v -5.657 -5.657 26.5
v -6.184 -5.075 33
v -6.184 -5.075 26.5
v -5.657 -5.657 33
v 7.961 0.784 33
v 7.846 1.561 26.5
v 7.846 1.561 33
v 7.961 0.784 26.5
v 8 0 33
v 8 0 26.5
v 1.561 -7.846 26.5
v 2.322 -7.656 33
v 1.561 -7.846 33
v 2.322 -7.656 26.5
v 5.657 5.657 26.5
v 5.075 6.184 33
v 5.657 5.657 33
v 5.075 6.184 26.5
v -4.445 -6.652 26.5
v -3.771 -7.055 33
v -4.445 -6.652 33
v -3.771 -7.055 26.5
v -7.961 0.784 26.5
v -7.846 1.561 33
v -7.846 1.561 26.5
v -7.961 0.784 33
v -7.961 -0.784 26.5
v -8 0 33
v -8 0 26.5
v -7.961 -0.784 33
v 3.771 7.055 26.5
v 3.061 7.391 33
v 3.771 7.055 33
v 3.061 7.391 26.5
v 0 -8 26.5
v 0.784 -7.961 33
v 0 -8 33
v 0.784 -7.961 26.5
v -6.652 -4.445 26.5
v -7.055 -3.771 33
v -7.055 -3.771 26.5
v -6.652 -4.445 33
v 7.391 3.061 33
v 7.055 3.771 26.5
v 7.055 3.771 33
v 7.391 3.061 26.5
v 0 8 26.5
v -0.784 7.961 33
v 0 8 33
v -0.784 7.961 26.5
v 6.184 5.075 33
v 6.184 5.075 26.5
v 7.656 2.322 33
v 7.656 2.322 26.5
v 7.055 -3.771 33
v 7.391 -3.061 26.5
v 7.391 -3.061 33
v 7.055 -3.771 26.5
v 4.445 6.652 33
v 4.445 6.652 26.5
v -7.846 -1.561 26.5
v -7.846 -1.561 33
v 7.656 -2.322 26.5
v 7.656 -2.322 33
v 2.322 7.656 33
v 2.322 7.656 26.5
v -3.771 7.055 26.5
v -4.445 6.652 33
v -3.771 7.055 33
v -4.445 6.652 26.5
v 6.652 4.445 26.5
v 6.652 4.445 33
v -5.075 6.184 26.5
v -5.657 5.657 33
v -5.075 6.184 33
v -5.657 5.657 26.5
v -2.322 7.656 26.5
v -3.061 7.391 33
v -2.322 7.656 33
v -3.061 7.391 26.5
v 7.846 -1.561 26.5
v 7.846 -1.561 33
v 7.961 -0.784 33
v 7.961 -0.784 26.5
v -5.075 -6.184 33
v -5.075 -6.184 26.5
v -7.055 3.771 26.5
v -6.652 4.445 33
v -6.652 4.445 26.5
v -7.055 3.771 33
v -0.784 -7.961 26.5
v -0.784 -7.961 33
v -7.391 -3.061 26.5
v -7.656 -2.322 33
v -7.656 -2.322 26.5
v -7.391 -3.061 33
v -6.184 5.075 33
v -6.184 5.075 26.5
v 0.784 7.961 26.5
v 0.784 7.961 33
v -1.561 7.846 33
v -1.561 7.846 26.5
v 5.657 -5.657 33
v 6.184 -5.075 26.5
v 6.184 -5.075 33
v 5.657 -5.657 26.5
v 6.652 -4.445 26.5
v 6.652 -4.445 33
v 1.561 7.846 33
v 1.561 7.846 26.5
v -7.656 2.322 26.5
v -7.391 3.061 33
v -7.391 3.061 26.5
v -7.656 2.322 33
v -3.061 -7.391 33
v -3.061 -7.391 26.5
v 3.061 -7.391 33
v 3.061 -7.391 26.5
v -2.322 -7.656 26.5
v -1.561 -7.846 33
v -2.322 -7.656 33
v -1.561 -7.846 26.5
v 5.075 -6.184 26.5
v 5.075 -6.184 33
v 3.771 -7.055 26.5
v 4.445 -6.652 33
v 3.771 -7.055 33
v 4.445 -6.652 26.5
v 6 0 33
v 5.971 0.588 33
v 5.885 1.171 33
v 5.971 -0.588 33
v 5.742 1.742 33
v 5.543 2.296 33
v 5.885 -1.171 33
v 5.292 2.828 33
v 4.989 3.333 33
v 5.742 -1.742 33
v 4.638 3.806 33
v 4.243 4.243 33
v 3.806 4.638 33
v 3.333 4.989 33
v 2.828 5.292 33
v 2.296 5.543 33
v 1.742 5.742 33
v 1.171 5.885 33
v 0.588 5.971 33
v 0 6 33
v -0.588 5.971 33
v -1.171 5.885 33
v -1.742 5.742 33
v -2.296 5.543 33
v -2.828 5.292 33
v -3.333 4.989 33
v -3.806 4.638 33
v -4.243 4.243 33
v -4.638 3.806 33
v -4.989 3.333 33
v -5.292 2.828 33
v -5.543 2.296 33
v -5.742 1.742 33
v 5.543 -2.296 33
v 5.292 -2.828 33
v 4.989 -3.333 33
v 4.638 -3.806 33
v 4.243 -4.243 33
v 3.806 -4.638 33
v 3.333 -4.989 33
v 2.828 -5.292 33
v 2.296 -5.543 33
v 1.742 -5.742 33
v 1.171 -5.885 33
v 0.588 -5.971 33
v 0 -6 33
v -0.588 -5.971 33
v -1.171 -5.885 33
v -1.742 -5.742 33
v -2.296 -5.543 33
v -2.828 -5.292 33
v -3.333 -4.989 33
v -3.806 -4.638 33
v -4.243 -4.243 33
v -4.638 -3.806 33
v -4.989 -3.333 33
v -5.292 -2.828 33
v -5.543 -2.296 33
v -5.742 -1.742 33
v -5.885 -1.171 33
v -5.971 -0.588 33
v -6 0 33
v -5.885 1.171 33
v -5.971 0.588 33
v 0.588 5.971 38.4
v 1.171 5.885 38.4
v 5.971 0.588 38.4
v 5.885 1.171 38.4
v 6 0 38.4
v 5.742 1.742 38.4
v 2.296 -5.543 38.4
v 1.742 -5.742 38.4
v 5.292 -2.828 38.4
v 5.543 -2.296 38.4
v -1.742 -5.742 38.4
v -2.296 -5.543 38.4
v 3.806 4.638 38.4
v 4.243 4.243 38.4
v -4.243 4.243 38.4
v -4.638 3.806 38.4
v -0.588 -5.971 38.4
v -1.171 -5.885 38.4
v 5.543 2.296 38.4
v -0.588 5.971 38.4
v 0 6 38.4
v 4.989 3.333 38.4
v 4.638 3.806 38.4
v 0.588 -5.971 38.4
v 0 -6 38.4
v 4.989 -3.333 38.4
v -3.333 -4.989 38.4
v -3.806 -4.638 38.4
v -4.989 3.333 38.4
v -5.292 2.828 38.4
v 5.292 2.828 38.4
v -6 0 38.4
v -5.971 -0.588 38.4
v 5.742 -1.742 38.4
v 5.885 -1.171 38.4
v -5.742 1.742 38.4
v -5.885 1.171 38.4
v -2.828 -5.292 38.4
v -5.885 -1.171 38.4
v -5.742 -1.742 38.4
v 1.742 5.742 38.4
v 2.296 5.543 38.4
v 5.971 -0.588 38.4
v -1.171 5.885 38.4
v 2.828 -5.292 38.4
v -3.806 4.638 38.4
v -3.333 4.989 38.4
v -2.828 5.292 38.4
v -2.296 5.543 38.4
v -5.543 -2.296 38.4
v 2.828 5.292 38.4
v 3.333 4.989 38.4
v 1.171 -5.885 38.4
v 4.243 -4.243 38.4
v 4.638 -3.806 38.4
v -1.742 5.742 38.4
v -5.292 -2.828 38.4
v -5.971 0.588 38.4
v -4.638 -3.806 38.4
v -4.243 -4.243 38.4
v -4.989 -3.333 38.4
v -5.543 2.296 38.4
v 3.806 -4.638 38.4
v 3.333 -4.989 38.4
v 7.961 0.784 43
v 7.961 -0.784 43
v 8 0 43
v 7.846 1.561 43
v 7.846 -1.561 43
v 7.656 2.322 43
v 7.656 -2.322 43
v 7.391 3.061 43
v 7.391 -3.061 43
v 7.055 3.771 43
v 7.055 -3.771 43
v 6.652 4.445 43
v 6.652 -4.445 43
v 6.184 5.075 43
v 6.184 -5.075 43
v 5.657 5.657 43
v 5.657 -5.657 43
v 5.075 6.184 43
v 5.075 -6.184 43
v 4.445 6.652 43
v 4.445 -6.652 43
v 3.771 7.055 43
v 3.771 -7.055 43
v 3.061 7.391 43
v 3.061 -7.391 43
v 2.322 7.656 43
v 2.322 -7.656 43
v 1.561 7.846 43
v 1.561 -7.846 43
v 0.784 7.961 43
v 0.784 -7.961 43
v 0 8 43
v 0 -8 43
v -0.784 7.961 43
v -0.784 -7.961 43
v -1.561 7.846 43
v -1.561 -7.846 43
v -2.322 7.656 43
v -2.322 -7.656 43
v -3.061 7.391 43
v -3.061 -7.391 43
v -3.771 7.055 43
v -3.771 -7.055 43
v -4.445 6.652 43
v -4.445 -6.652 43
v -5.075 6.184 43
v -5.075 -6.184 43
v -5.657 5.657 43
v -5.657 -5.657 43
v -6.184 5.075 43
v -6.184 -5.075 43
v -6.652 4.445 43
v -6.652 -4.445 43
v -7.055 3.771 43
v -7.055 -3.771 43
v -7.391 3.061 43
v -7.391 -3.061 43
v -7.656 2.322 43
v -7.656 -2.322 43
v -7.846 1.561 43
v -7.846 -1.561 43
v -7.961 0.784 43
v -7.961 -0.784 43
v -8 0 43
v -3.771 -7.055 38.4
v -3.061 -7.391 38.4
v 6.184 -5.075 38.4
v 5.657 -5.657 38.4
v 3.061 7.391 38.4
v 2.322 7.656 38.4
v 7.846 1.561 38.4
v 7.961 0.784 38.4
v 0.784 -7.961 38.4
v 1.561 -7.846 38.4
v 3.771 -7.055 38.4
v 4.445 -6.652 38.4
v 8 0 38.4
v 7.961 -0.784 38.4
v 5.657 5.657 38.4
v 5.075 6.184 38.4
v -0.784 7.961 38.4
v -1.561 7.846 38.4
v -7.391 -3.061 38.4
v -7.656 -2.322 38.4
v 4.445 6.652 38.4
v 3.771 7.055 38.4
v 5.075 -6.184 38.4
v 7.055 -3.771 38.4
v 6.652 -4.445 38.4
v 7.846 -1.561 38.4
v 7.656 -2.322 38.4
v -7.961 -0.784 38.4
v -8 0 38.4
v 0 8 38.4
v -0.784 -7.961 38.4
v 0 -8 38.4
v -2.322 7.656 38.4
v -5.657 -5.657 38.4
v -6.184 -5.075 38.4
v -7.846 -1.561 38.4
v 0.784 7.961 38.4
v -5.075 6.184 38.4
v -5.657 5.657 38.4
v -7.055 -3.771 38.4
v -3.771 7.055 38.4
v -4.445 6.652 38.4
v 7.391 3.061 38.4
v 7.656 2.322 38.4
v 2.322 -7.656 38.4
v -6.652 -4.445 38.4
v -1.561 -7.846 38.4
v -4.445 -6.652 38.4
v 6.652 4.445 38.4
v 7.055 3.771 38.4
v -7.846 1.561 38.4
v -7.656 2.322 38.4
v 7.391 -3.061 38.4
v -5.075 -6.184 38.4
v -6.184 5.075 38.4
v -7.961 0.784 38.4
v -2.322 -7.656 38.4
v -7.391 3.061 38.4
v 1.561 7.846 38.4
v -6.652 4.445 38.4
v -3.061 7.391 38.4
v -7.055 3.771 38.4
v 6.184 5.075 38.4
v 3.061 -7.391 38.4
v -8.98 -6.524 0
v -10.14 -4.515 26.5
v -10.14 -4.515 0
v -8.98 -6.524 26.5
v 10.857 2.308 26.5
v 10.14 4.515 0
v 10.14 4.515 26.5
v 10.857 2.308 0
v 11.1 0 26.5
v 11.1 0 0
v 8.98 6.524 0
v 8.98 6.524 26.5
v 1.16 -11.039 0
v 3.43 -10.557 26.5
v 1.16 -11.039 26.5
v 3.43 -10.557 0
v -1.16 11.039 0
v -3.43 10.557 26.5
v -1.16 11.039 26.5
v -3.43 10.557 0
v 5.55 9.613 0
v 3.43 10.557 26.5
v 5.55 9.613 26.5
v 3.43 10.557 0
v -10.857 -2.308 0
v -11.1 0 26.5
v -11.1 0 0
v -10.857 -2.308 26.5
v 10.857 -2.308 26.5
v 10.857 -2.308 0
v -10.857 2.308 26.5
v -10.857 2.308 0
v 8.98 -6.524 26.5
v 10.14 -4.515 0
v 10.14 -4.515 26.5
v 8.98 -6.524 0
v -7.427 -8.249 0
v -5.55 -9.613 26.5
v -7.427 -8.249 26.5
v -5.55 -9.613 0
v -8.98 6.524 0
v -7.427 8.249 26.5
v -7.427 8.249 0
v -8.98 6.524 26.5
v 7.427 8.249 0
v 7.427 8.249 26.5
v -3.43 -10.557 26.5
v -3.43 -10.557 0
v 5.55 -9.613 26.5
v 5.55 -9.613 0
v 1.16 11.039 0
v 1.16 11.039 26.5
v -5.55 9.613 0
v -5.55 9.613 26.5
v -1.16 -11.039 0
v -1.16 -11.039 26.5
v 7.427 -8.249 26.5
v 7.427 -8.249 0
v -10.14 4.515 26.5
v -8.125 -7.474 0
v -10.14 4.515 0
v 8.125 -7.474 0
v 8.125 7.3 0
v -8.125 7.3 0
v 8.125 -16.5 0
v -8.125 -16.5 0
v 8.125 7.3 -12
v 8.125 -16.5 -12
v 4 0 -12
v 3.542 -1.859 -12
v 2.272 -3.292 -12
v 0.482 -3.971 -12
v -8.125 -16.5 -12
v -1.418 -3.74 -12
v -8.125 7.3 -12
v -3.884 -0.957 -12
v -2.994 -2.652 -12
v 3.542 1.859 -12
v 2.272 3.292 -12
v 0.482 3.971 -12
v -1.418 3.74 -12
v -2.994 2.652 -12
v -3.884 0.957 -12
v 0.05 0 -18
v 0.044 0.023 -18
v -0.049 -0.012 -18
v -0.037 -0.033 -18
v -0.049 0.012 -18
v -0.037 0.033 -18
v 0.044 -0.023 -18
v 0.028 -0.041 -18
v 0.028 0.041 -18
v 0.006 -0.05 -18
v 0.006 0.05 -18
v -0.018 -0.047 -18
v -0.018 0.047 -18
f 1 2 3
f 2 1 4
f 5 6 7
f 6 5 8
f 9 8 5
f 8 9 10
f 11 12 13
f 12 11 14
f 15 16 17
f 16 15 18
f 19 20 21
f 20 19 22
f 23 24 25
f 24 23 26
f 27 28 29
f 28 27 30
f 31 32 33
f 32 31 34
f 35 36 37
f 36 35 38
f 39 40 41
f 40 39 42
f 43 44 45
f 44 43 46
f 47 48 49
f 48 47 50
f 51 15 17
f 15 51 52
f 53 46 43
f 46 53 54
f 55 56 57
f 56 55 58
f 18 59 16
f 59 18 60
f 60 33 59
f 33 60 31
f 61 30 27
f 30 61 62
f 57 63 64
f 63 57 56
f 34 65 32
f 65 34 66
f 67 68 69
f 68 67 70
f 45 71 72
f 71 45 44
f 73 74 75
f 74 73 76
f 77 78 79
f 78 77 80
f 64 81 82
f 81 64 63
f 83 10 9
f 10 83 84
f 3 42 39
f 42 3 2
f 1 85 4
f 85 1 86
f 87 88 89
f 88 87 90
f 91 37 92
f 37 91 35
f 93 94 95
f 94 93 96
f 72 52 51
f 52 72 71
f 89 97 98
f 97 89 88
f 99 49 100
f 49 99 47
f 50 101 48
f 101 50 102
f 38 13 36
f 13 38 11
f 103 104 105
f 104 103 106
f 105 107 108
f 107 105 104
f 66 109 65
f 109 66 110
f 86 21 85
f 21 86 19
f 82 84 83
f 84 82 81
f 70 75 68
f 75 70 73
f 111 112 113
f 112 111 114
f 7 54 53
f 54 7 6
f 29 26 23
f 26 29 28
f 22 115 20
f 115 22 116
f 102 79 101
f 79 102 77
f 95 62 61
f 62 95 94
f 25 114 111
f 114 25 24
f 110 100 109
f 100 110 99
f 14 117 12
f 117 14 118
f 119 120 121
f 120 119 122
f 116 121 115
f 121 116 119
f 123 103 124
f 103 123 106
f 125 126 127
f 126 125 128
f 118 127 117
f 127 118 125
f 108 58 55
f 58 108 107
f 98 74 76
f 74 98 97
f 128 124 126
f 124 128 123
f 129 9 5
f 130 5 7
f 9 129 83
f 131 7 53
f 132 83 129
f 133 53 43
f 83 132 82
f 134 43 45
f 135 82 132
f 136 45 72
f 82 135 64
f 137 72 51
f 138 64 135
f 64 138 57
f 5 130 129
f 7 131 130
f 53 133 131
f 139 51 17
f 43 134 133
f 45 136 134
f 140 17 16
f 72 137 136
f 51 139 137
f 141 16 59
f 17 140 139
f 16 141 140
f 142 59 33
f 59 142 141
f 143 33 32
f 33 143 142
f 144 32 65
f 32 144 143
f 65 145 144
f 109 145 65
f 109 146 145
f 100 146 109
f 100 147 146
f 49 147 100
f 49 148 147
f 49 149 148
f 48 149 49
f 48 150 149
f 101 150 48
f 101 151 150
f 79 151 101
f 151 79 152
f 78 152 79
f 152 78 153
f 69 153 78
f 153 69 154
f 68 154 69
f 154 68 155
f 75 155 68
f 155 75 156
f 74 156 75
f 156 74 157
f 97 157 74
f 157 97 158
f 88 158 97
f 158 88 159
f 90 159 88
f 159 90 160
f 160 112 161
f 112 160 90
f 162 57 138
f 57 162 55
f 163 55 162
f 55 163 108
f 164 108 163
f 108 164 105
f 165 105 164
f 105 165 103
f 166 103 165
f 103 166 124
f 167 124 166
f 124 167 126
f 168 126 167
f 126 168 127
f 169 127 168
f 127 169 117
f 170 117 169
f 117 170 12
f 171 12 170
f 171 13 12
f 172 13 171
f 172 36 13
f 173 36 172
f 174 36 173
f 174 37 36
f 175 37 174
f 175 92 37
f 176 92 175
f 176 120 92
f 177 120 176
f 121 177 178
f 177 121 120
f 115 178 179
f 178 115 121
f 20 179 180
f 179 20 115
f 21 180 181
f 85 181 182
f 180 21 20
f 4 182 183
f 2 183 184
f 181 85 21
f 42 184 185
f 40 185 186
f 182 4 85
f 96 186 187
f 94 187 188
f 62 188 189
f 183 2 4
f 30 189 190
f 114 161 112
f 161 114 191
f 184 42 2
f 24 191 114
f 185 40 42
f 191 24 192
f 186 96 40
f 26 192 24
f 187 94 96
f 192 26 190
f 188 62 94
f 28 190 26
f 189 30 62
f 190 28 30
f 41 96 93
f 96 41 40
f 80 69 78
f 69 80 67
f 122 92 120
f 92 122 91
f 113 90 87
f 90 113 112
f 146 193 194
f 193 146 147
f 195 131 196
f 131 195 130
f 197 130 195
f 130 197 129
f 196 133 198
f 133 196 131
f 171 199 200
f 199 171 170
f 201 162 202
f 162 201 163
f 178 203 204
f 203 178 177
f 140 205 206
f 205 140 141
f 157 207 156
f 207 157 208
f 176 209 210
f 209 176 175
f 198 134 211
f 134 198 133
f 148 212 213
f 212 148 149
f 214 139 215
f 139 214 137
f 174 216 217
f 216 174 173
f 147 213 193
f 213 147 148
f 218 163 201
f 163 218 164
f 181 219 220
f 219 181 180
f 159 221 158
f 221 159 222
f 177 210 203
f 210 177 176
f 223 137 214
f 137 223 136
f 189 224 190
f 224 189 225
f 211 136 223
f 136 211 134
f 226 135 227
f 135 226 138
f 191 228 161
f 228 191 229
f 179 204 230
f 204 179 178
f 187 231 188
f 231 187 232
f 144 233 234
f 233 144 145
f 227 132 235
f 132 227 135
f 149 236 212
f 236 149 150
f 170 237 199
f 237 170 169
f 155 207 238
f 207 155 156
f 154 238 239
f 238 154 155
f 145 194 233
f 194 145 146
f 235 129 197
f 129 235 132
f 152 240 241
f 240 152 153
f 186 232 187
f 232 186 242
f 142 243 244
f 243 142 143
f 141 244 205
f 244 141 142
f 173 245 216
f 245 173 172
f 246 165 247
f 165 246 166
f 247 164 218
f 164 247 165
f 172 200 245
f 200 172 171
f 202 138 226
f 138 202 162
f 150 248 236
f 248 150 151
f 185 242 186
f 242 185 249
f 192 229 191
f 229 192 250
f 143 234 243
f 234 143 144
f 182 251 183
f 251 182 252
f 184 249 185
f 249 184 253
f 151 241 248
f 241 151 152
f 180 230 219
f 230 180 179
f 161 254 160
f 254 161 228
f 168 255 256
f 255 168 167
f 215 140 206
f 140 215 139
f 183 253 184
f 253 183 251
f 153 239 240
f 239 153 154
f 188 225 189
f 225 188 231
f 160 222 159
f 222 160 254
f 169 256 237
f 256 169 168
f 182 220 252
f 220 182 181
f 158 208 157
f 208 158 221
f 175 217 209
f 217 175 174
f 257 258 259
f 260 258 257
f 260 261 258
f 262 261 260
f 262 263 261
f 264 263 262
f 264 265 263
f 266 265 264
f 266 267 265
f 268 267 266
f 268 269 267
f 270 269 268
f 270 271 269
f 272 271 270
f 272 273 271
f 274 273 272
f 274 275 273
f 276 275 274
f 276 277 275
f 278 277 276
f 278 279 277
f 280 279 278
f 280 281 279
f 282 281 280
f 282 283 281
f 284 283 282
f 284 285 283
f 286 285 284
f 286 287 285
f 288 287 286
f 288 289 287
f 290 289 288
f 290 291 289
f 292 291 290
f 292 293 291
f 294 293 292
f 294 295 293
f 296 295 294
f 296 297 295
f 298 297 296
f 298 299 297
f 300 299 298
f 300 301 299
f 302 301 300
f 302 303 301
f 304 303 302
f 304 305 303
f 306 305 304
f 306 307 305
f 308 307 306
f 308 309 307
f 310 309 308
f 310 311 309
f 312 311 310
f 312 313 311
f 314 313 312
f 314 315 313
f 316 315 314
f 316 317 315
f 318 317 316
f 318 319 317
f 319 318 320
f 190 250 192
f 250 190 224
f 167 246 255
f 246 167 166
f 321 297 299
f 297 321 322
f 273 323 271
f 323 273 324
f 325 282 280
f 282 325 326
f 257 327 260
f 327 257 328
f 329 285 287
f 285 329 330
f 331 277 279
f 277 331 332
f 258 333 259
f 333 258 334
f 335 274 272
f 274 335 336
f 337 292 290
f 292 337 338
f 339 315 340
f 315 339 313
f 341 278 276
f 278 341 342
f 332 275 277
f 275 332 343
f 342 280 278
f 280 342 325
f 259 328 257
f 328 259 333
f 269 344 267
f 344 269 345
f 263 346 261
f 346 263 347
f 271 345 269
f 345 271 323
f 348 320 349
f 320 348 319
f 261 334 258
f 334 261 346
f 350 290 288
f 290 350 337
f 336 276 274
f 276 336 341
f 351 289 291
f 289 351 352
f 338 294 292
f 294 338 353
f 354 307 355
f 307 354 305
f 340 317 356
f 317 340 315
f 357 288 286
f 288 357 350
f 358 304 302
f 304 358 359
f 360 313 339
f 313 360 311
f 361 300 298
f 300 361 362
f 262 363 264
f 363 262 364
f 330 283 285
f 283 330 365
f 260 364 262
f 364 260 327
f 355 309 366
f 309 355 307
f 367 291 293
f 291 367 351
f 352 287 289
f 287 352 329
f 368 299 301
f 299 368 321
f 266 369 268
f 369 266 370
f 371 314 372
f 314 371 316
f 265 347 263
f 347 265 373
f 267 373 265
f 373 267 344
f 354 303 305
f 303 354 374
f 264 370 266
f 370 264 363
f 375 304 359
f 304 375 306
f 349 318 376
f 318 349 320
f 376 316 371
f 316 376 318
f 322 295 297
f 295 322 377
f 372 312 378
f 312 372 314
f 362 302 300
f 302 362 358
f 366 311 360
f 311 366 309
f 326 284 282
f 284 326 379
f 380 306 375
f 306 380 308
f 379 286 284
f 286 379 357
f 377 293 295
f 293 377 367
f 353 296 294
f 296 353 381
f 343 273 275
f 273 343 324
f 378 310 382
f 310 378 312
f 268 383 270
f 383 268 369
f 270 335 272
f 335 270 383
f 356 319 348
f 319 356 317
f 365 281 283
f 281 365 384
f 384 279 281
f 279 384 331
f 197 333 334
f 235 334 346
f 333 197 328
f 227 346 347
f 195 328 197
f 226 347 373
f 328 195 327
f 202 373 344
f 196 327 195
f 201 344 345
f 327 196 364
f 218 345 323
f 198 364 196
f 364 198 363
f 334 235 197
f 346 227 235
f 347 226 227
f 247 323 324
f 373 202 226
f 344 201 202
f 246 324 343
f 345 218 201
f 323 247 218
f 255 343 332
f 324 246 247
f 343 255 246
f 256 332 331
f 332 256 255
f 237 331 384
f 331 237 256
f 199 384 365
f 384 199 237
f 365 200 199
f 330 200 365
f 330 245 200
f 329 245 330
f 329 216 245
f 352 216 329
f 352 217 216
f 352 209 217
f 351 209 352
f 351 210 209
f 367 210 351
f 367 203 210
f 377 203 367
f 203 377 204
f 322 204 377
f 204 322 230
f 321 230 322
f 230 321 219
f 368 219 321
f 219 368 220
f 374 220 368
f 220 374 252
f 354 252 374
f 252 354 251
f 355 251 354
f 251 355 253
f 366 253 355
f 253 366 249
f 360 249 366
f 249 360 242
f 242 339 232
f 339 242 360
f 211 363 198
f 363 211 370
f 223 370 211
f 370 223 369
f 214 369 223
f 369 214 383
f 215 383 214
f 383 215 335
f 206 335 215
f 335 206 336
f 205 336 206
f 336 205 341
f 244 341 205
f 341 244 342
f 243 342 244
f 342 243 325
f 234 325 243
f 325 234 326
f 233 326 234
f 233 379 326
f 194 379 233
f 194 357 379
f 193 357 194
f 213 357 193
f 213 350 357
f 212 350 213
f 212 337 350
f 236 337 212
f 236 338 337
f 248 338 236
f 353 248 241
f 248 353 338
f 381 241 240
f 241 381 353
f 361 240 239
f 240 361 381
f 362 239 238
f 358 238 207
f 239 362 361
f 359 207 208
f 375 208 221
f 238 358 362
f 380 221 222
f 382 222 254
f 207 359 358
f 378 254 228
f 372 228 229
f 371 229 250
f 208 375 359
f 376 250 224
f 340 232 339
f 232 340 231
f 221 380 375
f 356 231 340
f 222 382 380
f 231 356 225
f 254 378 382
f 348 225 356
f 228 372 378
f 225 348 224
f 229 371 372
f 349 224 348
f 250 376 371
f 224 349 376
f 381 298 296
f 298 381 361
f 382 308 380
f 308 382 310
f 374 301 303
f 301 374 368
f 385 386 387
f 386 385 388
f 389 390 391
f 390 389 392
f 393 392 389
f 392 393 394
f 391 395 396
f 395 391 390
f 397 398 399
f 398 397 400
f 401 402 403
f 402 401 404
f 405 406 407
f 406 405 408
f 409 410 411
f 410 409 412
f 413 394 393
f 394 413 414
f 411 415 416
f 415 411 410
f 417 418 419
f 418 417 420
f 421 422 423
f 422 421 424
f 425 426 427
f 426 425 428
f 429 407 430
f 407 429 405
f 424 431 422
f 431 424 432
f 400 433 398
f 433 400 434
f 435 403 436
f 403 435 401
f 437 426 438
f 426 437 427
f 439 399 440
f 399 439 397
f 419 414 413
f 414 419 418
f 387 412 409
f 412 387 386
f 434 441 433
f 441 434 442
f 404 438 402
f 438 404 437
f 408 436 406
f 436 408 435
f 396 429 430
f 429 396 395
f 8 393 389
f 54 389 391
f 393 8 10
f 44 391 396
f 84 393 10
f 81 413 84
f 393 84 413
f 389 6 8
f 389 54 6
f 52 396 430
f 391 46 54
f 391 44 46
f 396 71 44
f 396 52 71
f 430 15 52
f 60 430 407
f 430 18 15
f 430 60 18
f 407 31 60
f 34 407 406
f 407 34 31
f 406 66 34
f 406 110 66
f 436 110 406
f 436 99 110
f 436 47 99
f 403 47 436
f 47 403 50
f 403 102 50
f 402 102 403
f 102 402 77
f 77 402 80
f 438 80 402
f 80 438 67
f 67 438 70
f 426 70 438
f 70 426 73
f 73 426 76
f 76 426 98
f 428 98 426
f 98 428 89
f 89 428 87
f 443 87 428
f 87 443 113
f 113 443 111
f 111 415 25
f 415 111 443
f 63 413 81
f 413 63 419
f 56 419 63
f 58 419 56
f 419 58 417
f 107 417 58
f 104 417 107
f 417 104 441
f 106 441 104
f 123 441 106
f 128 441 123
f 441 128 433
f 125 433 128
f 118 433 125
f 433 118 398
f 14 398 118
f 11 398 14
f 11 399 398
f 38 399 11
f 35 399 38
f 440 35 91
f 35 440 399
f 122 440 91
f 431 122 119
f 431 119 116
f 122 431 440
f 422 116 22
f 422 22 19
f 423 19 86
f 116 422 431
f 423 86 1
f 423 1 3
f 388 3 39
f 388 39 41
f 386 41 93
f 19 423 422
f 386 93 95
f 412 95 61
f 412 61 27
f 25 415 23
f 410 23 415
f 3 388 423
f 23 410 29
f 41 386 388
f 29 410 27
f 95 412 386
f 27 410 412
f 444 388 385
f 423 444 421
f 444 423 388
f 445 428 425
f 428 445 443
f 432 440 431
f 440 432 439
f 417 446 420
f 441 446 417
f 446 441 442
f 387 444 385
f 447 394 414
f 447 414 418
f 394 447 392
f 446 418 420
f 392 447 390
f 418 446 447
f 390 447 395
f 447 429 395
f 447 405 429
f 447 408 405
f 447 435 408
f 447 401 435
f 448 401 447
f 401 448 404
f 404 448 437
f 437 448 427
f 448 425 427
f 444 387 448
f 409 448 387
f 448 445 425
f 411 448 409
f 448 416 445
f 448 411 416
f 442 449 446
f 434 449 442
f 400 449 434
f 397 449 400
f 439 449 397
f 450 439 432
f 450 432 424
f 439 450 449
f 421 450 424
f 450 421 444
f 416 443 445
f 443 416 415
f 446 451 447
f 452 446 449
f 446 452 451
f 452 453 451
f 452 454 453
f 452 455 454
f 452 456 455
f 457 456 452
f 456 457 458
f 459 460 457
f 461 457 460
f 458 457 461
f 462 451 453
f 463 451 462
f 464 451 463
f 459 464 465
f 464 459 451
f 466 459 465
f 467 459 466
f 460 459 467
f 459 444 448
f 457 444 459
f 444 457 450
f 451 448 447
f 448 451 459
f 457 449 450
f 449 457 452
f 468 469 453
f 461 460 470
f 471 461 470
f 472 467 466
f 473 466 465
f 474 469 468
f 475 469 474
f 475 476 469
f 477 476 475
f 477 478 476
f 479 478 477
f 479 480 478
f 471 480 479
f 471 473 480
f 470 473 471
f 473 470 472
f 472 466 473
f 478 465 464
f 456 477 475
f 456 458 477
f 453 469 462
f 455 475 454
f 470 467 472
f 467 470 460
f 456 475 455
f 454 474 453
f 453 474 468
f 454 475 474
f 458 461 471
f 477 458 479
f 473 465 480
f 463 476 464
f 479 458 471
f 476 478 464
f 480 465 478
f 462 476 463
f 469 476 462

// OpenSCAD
  //ptediam = 4.1; //on scalar printer
  ptediam = 4.6; //on ender 5 printer
//translate([37,6,-10])  rotate([0,0,180])rotate([90,180,0])
E3DV6();
function e3doffset(pos) = (pos == "top") ? -43 : (pos == "middle") ? 0 : 18;
module E3DV6(vulcan=false, offset = "middle", asmask = true)
{
  translate([0,0,e3doffset(offset)])
  {
    cylinder(d=22.2, h=26.5);//main body
    translate([0,0,30]) ColletRingMask(extend = 5,mask = true);

    //cylinder(d=16, h=33.9);
    //cylinder(d=12, h=43);
    //  translate([0,0,39])cylinder(d=16, h=4);
    translate([0,-4.6,-6])cube([16.25,23.8,12], center = true);
    translate([0,0,-18])cylinder(d2=8, d1=0.1, h=6);
    if(vulcan)
    {
      /*
         Gesamth 65.5
         mit Spitze 71
         Breite H 12
         Breite H 20
         Hoehr H 20
         Hoehe Heizkoepf Kuehler bis ausgang spitze 22.2

       */
    }//
  }
}// module E3DV6(vulcan=false)

function ptdiam(mask,luft) = (mask)? ptediam+luft : ptediam -luft;
module ColletRing(extend = 0,luft = 0.2,mask = false)
{
  difference()
  {
    ColletRingMask(extend, mask = mask);
    translate([0,0,-1]) cylinder(d=ptdiam(mask,luft), h= 15+extend, $fn = 64);
  }
}// module ColletRing()
function topRing(mask) = (mask) ? 4.6 : 3.9;
module ColletRingMask(extend = 0,mask = true)
{
  $fn =64;
  translate([0,0,-extend])
  {
    cylinder(d=16, h=3.0+extend);
    //color("green")
    cylinder(d=12, h=13.0+extend);
  }
  translate([0,0,9+4-topRing(mask)])cylinder(d=16, h=topRing(mask));

}// module ColletRingMask()
